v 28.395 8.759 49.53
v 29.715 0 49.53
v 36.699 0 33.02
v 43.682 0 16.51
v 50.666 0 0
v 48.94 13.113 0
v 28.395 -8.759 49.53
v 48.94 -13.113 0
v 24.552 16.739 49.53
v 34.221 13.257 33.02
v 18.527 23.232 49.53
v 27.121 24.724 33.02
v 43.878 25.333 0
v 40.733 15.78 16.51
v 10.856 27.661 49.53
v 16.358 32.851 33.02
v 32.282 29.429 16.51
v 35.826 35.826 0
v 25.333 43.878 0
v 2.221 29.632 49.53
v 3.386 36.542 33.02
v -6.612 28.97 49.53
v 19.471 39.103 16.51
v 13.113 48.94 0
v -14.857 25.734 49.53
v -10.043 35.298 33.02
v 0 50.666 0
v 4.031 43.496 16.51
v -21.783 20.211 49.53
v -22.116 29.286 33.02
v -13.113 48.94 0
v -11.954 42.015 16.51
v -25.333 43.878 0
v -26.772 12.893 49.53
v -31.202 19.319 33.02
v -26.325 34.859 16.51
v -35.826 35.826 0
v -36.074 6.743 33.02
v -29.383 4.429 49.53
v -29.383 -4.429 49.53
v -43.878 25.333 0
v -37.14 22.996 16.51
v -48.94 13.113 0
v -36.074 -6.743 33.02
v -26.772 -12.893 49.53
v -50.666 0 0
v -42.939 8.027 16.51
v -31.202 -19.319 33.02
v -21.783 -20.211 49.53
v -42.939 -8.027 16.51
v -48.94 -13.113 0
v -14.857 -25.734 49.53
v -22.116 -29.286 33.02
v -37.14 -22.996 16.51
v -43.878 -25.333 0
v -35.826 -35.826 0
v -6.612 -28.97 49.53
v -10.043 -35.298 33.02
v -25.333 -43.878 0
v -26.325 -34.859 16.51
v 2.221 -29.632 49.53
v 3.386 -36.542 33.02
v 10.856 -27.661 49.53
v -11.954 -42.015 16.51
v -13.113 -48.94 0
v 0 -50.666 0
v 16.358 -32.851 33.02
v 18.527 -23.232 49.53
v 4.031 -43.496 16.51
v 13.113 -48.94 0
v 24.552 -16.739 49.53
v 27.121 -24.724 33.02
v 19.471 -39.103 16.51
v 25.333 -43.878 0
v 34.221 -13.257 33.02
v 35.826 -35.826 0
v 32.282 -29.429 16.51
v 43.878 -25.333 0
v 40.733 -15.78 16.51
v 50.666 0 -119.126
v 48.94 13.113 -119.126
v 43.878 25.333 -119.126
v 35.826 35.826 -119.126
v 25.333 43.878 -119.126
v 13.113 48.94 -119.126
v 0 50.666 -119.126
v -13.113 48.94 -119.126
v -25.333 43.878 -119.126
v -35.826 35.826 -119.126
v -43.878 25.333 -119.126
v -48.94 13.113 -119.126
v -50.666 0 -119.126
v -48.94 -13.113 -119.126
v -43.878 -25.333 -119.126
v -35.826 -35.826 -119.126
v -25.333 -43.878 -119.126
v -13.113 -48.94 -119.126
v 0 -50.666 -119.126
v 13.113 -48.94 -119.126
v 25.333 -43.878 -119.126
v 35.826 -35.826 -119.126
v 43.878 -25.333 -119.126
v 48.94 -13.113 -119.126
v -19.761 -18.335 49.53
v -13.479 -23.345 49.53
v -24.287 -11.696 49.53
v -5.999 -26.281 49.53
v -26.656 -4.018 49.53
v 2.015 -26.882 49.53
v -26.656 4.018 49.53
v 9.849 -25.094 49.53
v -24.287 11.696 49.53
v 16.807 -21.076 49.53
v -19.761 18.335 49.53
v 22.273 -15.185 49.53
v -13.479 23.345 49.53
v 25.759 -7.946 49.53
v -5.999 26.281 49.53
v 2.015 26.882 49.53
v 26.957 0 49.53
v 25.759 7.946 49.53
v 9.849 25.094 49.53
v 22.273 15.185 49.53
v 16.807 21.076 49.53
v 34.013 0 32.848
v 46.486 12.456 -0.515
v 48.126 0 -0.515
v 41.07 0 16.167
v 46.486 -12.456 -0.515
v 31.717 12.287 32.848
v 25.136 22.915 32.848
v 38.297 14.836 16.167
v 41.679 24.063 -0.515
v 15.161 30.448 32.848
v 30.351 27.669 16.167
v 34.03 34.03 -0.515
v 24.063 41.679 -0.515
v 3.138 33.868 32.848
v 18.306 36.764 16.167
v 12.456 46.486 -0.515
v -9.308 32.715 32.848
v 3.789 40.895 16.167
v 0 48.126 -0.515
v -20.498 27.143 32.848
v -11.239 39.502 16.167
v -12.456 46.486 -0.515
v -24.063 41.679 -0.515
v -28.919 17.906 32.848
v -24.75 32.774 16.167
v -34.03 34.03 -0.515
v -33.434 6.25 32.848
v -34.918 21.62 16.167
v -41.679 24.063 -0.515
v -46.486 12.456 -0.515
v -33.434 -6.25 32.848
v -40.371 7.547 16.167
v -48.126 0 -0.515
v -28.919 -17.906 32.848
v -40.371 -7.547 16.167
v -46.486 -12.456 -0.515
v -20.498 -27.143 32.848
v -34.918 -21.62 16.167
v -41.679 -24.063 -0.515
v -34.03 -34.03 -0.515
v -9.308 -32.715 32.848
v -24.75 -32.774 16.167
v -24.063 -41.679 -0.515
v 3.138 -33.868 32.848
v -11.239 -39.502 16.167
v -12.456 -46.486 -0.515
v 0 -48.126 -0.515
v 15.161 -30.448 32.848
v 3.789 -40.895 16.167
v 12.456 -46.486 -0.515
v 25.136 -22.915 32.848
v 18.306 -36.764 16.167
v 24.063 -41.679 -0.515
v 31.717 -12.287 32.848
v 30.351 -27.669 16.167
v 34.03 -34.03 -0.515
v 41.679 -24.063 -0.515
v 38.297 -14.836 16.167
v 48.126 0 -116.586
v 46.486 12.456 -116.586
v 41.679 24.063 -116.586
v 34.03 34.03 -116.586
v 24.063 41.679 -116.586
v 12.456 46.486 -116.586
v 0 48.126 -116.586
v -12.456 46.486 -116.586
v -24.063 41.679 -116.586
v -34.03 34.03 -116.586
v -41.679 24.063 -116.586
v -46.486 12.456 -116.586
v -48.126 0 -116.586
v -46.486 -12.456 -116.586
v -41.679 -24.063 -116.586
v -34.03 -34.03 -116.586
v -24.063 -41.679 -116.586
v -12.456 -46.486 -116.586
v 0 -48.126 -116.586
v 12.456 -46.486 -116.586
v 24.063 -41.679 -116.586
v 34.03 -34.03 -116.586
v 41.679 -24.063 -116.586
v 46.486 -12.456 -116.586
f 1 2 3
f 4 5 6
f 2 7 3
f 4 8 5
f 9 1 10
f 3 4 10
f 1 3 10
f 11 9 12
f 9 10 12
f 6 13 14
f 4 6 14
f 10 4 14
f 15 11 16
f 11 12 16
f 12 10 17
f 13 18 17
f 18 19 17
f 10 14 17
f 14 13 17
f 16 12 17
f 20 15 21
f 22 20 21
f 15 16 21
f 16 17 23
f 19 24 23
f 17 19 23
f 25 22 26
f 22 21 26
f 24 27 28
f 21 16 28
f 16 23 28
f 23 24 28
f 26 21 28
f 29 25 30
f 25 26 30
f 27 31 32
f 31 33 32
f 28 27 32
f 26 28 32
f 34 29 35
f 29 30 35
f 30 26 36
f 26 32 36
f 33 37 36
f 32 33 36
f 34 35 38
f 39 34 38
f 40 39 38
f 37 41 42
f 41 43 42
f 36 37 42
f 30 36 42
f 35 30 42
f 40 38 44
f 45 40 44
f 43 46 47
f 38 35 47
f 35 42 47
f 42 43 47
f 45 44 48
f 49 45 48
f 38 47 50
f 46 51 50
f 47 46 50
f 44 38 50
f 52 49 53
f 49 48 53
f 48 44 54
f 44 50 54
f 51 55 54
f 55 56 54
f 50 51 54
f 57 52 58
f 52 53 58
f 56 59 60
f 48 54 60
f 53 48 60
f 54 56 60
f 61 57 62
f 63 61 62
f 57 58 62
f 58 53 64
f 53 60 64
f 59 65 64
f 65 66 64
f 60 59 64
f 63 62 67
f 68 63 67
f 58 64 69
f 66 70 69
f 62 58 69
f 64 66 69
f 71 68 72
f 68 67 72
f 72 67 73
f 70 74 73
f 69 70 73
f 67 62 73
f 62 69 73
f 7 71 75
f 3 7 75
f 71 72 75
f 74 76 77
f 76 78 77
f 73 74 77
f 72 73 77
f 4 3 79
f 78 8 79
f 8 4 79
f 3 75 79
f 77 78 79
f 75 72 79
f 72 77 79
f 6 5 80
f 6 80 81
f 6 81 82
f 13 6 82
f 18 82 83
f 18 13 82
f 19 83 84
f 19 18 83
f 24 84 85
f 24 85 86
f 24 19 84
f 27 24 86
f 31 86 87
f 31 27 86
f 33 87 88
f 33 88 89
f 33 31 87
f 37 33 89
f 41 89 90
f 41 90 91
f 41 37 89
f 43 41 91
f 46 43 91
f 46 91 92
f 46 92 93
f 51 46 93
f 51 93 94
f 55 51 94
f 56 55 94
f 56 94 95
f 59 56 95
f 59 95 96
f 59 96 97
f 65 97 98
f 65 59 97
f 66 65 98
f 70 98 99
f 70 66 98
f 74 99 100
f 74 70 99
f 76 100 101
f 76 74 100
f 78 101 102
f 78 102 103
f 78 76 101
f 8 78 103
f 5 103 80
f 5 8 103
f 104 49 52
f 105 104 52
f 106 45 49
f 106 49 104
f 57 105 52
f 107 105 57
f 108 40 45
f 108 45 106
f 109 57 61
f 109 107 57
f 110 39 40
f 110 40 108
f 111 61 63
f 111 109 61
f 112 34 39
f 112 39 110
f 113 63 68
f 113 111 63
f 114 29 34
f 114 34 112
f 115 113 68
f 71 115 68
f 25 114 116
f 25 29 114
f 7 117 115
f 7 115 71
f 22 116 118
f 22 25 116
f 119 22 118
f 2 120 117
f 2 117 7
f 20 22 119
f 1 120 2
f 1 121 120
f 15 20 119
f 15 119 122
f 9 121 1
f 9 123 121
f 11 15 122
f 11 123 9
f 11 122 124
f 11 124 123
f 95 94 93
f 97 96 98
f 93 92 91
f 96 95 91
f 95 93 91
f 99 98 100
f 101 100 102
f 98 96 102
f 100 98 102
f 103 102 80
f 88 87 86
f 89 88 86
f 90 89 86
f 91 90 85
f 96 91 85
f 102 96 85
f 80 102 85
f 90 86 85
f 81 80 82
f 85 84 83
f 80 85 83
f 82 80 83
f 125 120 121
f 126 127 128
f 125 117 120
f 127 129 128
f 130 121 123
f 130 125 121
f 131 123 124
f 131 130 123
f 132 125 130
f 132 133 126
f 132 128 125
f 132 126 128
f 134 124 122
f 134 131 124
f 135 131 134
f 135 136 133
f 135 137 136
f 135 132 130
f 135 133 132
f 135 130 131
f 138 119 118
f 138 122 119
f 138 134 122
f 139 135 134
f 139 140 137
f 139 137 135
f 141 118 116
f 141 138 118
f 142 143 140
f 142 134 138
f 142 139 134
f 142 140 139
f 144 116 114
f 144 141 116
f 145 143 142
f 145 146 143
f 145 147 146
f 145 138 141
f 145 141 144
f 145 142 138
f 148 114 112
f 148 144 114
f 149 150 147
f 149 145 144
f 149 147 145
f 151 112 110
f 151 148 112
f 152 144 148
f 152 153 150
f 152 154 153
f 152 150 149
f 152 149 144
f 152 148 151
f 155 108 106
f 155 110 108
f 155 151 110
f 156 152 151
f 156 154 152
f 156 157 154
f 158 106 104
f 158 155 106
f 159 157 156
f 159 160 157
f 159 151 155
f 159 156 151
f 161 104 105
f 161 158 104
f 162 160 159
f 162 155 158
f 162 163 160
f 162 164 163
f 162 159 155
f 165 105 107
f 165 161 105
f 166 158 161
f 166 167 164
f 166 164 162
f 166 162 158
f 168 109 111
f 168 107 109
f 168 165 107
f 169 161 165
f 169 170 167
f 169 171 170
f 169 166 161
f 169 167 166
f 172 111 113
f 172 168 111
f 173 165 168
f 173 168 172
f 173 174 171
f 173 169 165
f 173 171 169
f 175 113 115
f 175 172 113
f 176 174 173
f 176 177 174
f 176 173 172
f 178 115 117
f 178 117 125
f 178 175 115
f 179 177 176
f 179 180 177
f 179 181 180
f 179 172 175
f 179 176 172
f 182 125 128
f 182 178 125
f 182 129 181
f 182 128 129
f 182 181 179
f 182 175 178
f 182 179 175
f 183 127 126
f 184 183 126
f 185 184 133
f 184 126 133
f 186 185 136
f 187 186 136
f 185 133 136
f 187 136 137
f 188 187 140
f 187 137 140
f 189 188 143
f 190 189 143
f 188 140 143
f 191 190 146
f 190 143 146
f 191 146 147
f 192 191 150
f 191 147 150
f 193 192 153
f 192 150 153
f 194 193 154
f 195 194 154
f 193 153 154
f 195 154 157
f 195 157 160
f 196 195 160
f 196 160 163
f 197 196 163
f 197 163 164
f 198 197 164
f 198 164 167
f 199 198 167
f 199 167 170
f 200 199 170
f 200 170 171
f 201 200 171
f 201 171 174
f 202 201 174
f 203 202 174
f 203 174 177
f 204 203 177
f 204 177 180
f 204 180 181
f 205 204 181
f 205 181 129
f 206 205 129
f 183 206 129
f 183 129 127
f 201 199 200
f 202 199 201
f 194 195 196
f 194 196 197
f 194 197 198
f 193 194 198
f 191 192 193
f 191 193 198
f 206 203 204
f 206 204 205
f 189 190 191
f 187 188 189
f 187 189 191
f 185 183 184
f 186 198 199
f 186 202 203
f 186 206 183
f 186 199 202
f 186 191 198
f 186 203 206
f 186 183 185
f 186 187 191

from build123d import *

# Parameters (mm, degrees)
F2_R     = 29.7149419412
F0_R     = 50.6662740333
F4_DEPTH = 119.126
F5_T     = -2.54


with BuildPart() as f3:
    # F2 (on offset) → F3 section 0
    with BuildSketch(Plane.XY.offset(49.53)):
        Circle(F2_R)
    # F0 (on Top) → F3 section 1
    with BuildSketch(Plane.XY):
        Circle(F0_R)
    loft()

    # F4 (add): a face of the model
    f4_faces = [f3.faces().sort_by_distance(p)[0] for p in [
        (0, 0, 0),
    ]]
    extrude(f4_faces, amount=F4_DEPTH)

    # F5
    f5_openings = [f3.faces().sort_by_distance(p)[0] for p in [
        (0, 0, 49.53),
    ]]
    offset(amount=F5_T, openings=f5_openings, kind=Kind.INTERSECTION)


solid = f3.part
